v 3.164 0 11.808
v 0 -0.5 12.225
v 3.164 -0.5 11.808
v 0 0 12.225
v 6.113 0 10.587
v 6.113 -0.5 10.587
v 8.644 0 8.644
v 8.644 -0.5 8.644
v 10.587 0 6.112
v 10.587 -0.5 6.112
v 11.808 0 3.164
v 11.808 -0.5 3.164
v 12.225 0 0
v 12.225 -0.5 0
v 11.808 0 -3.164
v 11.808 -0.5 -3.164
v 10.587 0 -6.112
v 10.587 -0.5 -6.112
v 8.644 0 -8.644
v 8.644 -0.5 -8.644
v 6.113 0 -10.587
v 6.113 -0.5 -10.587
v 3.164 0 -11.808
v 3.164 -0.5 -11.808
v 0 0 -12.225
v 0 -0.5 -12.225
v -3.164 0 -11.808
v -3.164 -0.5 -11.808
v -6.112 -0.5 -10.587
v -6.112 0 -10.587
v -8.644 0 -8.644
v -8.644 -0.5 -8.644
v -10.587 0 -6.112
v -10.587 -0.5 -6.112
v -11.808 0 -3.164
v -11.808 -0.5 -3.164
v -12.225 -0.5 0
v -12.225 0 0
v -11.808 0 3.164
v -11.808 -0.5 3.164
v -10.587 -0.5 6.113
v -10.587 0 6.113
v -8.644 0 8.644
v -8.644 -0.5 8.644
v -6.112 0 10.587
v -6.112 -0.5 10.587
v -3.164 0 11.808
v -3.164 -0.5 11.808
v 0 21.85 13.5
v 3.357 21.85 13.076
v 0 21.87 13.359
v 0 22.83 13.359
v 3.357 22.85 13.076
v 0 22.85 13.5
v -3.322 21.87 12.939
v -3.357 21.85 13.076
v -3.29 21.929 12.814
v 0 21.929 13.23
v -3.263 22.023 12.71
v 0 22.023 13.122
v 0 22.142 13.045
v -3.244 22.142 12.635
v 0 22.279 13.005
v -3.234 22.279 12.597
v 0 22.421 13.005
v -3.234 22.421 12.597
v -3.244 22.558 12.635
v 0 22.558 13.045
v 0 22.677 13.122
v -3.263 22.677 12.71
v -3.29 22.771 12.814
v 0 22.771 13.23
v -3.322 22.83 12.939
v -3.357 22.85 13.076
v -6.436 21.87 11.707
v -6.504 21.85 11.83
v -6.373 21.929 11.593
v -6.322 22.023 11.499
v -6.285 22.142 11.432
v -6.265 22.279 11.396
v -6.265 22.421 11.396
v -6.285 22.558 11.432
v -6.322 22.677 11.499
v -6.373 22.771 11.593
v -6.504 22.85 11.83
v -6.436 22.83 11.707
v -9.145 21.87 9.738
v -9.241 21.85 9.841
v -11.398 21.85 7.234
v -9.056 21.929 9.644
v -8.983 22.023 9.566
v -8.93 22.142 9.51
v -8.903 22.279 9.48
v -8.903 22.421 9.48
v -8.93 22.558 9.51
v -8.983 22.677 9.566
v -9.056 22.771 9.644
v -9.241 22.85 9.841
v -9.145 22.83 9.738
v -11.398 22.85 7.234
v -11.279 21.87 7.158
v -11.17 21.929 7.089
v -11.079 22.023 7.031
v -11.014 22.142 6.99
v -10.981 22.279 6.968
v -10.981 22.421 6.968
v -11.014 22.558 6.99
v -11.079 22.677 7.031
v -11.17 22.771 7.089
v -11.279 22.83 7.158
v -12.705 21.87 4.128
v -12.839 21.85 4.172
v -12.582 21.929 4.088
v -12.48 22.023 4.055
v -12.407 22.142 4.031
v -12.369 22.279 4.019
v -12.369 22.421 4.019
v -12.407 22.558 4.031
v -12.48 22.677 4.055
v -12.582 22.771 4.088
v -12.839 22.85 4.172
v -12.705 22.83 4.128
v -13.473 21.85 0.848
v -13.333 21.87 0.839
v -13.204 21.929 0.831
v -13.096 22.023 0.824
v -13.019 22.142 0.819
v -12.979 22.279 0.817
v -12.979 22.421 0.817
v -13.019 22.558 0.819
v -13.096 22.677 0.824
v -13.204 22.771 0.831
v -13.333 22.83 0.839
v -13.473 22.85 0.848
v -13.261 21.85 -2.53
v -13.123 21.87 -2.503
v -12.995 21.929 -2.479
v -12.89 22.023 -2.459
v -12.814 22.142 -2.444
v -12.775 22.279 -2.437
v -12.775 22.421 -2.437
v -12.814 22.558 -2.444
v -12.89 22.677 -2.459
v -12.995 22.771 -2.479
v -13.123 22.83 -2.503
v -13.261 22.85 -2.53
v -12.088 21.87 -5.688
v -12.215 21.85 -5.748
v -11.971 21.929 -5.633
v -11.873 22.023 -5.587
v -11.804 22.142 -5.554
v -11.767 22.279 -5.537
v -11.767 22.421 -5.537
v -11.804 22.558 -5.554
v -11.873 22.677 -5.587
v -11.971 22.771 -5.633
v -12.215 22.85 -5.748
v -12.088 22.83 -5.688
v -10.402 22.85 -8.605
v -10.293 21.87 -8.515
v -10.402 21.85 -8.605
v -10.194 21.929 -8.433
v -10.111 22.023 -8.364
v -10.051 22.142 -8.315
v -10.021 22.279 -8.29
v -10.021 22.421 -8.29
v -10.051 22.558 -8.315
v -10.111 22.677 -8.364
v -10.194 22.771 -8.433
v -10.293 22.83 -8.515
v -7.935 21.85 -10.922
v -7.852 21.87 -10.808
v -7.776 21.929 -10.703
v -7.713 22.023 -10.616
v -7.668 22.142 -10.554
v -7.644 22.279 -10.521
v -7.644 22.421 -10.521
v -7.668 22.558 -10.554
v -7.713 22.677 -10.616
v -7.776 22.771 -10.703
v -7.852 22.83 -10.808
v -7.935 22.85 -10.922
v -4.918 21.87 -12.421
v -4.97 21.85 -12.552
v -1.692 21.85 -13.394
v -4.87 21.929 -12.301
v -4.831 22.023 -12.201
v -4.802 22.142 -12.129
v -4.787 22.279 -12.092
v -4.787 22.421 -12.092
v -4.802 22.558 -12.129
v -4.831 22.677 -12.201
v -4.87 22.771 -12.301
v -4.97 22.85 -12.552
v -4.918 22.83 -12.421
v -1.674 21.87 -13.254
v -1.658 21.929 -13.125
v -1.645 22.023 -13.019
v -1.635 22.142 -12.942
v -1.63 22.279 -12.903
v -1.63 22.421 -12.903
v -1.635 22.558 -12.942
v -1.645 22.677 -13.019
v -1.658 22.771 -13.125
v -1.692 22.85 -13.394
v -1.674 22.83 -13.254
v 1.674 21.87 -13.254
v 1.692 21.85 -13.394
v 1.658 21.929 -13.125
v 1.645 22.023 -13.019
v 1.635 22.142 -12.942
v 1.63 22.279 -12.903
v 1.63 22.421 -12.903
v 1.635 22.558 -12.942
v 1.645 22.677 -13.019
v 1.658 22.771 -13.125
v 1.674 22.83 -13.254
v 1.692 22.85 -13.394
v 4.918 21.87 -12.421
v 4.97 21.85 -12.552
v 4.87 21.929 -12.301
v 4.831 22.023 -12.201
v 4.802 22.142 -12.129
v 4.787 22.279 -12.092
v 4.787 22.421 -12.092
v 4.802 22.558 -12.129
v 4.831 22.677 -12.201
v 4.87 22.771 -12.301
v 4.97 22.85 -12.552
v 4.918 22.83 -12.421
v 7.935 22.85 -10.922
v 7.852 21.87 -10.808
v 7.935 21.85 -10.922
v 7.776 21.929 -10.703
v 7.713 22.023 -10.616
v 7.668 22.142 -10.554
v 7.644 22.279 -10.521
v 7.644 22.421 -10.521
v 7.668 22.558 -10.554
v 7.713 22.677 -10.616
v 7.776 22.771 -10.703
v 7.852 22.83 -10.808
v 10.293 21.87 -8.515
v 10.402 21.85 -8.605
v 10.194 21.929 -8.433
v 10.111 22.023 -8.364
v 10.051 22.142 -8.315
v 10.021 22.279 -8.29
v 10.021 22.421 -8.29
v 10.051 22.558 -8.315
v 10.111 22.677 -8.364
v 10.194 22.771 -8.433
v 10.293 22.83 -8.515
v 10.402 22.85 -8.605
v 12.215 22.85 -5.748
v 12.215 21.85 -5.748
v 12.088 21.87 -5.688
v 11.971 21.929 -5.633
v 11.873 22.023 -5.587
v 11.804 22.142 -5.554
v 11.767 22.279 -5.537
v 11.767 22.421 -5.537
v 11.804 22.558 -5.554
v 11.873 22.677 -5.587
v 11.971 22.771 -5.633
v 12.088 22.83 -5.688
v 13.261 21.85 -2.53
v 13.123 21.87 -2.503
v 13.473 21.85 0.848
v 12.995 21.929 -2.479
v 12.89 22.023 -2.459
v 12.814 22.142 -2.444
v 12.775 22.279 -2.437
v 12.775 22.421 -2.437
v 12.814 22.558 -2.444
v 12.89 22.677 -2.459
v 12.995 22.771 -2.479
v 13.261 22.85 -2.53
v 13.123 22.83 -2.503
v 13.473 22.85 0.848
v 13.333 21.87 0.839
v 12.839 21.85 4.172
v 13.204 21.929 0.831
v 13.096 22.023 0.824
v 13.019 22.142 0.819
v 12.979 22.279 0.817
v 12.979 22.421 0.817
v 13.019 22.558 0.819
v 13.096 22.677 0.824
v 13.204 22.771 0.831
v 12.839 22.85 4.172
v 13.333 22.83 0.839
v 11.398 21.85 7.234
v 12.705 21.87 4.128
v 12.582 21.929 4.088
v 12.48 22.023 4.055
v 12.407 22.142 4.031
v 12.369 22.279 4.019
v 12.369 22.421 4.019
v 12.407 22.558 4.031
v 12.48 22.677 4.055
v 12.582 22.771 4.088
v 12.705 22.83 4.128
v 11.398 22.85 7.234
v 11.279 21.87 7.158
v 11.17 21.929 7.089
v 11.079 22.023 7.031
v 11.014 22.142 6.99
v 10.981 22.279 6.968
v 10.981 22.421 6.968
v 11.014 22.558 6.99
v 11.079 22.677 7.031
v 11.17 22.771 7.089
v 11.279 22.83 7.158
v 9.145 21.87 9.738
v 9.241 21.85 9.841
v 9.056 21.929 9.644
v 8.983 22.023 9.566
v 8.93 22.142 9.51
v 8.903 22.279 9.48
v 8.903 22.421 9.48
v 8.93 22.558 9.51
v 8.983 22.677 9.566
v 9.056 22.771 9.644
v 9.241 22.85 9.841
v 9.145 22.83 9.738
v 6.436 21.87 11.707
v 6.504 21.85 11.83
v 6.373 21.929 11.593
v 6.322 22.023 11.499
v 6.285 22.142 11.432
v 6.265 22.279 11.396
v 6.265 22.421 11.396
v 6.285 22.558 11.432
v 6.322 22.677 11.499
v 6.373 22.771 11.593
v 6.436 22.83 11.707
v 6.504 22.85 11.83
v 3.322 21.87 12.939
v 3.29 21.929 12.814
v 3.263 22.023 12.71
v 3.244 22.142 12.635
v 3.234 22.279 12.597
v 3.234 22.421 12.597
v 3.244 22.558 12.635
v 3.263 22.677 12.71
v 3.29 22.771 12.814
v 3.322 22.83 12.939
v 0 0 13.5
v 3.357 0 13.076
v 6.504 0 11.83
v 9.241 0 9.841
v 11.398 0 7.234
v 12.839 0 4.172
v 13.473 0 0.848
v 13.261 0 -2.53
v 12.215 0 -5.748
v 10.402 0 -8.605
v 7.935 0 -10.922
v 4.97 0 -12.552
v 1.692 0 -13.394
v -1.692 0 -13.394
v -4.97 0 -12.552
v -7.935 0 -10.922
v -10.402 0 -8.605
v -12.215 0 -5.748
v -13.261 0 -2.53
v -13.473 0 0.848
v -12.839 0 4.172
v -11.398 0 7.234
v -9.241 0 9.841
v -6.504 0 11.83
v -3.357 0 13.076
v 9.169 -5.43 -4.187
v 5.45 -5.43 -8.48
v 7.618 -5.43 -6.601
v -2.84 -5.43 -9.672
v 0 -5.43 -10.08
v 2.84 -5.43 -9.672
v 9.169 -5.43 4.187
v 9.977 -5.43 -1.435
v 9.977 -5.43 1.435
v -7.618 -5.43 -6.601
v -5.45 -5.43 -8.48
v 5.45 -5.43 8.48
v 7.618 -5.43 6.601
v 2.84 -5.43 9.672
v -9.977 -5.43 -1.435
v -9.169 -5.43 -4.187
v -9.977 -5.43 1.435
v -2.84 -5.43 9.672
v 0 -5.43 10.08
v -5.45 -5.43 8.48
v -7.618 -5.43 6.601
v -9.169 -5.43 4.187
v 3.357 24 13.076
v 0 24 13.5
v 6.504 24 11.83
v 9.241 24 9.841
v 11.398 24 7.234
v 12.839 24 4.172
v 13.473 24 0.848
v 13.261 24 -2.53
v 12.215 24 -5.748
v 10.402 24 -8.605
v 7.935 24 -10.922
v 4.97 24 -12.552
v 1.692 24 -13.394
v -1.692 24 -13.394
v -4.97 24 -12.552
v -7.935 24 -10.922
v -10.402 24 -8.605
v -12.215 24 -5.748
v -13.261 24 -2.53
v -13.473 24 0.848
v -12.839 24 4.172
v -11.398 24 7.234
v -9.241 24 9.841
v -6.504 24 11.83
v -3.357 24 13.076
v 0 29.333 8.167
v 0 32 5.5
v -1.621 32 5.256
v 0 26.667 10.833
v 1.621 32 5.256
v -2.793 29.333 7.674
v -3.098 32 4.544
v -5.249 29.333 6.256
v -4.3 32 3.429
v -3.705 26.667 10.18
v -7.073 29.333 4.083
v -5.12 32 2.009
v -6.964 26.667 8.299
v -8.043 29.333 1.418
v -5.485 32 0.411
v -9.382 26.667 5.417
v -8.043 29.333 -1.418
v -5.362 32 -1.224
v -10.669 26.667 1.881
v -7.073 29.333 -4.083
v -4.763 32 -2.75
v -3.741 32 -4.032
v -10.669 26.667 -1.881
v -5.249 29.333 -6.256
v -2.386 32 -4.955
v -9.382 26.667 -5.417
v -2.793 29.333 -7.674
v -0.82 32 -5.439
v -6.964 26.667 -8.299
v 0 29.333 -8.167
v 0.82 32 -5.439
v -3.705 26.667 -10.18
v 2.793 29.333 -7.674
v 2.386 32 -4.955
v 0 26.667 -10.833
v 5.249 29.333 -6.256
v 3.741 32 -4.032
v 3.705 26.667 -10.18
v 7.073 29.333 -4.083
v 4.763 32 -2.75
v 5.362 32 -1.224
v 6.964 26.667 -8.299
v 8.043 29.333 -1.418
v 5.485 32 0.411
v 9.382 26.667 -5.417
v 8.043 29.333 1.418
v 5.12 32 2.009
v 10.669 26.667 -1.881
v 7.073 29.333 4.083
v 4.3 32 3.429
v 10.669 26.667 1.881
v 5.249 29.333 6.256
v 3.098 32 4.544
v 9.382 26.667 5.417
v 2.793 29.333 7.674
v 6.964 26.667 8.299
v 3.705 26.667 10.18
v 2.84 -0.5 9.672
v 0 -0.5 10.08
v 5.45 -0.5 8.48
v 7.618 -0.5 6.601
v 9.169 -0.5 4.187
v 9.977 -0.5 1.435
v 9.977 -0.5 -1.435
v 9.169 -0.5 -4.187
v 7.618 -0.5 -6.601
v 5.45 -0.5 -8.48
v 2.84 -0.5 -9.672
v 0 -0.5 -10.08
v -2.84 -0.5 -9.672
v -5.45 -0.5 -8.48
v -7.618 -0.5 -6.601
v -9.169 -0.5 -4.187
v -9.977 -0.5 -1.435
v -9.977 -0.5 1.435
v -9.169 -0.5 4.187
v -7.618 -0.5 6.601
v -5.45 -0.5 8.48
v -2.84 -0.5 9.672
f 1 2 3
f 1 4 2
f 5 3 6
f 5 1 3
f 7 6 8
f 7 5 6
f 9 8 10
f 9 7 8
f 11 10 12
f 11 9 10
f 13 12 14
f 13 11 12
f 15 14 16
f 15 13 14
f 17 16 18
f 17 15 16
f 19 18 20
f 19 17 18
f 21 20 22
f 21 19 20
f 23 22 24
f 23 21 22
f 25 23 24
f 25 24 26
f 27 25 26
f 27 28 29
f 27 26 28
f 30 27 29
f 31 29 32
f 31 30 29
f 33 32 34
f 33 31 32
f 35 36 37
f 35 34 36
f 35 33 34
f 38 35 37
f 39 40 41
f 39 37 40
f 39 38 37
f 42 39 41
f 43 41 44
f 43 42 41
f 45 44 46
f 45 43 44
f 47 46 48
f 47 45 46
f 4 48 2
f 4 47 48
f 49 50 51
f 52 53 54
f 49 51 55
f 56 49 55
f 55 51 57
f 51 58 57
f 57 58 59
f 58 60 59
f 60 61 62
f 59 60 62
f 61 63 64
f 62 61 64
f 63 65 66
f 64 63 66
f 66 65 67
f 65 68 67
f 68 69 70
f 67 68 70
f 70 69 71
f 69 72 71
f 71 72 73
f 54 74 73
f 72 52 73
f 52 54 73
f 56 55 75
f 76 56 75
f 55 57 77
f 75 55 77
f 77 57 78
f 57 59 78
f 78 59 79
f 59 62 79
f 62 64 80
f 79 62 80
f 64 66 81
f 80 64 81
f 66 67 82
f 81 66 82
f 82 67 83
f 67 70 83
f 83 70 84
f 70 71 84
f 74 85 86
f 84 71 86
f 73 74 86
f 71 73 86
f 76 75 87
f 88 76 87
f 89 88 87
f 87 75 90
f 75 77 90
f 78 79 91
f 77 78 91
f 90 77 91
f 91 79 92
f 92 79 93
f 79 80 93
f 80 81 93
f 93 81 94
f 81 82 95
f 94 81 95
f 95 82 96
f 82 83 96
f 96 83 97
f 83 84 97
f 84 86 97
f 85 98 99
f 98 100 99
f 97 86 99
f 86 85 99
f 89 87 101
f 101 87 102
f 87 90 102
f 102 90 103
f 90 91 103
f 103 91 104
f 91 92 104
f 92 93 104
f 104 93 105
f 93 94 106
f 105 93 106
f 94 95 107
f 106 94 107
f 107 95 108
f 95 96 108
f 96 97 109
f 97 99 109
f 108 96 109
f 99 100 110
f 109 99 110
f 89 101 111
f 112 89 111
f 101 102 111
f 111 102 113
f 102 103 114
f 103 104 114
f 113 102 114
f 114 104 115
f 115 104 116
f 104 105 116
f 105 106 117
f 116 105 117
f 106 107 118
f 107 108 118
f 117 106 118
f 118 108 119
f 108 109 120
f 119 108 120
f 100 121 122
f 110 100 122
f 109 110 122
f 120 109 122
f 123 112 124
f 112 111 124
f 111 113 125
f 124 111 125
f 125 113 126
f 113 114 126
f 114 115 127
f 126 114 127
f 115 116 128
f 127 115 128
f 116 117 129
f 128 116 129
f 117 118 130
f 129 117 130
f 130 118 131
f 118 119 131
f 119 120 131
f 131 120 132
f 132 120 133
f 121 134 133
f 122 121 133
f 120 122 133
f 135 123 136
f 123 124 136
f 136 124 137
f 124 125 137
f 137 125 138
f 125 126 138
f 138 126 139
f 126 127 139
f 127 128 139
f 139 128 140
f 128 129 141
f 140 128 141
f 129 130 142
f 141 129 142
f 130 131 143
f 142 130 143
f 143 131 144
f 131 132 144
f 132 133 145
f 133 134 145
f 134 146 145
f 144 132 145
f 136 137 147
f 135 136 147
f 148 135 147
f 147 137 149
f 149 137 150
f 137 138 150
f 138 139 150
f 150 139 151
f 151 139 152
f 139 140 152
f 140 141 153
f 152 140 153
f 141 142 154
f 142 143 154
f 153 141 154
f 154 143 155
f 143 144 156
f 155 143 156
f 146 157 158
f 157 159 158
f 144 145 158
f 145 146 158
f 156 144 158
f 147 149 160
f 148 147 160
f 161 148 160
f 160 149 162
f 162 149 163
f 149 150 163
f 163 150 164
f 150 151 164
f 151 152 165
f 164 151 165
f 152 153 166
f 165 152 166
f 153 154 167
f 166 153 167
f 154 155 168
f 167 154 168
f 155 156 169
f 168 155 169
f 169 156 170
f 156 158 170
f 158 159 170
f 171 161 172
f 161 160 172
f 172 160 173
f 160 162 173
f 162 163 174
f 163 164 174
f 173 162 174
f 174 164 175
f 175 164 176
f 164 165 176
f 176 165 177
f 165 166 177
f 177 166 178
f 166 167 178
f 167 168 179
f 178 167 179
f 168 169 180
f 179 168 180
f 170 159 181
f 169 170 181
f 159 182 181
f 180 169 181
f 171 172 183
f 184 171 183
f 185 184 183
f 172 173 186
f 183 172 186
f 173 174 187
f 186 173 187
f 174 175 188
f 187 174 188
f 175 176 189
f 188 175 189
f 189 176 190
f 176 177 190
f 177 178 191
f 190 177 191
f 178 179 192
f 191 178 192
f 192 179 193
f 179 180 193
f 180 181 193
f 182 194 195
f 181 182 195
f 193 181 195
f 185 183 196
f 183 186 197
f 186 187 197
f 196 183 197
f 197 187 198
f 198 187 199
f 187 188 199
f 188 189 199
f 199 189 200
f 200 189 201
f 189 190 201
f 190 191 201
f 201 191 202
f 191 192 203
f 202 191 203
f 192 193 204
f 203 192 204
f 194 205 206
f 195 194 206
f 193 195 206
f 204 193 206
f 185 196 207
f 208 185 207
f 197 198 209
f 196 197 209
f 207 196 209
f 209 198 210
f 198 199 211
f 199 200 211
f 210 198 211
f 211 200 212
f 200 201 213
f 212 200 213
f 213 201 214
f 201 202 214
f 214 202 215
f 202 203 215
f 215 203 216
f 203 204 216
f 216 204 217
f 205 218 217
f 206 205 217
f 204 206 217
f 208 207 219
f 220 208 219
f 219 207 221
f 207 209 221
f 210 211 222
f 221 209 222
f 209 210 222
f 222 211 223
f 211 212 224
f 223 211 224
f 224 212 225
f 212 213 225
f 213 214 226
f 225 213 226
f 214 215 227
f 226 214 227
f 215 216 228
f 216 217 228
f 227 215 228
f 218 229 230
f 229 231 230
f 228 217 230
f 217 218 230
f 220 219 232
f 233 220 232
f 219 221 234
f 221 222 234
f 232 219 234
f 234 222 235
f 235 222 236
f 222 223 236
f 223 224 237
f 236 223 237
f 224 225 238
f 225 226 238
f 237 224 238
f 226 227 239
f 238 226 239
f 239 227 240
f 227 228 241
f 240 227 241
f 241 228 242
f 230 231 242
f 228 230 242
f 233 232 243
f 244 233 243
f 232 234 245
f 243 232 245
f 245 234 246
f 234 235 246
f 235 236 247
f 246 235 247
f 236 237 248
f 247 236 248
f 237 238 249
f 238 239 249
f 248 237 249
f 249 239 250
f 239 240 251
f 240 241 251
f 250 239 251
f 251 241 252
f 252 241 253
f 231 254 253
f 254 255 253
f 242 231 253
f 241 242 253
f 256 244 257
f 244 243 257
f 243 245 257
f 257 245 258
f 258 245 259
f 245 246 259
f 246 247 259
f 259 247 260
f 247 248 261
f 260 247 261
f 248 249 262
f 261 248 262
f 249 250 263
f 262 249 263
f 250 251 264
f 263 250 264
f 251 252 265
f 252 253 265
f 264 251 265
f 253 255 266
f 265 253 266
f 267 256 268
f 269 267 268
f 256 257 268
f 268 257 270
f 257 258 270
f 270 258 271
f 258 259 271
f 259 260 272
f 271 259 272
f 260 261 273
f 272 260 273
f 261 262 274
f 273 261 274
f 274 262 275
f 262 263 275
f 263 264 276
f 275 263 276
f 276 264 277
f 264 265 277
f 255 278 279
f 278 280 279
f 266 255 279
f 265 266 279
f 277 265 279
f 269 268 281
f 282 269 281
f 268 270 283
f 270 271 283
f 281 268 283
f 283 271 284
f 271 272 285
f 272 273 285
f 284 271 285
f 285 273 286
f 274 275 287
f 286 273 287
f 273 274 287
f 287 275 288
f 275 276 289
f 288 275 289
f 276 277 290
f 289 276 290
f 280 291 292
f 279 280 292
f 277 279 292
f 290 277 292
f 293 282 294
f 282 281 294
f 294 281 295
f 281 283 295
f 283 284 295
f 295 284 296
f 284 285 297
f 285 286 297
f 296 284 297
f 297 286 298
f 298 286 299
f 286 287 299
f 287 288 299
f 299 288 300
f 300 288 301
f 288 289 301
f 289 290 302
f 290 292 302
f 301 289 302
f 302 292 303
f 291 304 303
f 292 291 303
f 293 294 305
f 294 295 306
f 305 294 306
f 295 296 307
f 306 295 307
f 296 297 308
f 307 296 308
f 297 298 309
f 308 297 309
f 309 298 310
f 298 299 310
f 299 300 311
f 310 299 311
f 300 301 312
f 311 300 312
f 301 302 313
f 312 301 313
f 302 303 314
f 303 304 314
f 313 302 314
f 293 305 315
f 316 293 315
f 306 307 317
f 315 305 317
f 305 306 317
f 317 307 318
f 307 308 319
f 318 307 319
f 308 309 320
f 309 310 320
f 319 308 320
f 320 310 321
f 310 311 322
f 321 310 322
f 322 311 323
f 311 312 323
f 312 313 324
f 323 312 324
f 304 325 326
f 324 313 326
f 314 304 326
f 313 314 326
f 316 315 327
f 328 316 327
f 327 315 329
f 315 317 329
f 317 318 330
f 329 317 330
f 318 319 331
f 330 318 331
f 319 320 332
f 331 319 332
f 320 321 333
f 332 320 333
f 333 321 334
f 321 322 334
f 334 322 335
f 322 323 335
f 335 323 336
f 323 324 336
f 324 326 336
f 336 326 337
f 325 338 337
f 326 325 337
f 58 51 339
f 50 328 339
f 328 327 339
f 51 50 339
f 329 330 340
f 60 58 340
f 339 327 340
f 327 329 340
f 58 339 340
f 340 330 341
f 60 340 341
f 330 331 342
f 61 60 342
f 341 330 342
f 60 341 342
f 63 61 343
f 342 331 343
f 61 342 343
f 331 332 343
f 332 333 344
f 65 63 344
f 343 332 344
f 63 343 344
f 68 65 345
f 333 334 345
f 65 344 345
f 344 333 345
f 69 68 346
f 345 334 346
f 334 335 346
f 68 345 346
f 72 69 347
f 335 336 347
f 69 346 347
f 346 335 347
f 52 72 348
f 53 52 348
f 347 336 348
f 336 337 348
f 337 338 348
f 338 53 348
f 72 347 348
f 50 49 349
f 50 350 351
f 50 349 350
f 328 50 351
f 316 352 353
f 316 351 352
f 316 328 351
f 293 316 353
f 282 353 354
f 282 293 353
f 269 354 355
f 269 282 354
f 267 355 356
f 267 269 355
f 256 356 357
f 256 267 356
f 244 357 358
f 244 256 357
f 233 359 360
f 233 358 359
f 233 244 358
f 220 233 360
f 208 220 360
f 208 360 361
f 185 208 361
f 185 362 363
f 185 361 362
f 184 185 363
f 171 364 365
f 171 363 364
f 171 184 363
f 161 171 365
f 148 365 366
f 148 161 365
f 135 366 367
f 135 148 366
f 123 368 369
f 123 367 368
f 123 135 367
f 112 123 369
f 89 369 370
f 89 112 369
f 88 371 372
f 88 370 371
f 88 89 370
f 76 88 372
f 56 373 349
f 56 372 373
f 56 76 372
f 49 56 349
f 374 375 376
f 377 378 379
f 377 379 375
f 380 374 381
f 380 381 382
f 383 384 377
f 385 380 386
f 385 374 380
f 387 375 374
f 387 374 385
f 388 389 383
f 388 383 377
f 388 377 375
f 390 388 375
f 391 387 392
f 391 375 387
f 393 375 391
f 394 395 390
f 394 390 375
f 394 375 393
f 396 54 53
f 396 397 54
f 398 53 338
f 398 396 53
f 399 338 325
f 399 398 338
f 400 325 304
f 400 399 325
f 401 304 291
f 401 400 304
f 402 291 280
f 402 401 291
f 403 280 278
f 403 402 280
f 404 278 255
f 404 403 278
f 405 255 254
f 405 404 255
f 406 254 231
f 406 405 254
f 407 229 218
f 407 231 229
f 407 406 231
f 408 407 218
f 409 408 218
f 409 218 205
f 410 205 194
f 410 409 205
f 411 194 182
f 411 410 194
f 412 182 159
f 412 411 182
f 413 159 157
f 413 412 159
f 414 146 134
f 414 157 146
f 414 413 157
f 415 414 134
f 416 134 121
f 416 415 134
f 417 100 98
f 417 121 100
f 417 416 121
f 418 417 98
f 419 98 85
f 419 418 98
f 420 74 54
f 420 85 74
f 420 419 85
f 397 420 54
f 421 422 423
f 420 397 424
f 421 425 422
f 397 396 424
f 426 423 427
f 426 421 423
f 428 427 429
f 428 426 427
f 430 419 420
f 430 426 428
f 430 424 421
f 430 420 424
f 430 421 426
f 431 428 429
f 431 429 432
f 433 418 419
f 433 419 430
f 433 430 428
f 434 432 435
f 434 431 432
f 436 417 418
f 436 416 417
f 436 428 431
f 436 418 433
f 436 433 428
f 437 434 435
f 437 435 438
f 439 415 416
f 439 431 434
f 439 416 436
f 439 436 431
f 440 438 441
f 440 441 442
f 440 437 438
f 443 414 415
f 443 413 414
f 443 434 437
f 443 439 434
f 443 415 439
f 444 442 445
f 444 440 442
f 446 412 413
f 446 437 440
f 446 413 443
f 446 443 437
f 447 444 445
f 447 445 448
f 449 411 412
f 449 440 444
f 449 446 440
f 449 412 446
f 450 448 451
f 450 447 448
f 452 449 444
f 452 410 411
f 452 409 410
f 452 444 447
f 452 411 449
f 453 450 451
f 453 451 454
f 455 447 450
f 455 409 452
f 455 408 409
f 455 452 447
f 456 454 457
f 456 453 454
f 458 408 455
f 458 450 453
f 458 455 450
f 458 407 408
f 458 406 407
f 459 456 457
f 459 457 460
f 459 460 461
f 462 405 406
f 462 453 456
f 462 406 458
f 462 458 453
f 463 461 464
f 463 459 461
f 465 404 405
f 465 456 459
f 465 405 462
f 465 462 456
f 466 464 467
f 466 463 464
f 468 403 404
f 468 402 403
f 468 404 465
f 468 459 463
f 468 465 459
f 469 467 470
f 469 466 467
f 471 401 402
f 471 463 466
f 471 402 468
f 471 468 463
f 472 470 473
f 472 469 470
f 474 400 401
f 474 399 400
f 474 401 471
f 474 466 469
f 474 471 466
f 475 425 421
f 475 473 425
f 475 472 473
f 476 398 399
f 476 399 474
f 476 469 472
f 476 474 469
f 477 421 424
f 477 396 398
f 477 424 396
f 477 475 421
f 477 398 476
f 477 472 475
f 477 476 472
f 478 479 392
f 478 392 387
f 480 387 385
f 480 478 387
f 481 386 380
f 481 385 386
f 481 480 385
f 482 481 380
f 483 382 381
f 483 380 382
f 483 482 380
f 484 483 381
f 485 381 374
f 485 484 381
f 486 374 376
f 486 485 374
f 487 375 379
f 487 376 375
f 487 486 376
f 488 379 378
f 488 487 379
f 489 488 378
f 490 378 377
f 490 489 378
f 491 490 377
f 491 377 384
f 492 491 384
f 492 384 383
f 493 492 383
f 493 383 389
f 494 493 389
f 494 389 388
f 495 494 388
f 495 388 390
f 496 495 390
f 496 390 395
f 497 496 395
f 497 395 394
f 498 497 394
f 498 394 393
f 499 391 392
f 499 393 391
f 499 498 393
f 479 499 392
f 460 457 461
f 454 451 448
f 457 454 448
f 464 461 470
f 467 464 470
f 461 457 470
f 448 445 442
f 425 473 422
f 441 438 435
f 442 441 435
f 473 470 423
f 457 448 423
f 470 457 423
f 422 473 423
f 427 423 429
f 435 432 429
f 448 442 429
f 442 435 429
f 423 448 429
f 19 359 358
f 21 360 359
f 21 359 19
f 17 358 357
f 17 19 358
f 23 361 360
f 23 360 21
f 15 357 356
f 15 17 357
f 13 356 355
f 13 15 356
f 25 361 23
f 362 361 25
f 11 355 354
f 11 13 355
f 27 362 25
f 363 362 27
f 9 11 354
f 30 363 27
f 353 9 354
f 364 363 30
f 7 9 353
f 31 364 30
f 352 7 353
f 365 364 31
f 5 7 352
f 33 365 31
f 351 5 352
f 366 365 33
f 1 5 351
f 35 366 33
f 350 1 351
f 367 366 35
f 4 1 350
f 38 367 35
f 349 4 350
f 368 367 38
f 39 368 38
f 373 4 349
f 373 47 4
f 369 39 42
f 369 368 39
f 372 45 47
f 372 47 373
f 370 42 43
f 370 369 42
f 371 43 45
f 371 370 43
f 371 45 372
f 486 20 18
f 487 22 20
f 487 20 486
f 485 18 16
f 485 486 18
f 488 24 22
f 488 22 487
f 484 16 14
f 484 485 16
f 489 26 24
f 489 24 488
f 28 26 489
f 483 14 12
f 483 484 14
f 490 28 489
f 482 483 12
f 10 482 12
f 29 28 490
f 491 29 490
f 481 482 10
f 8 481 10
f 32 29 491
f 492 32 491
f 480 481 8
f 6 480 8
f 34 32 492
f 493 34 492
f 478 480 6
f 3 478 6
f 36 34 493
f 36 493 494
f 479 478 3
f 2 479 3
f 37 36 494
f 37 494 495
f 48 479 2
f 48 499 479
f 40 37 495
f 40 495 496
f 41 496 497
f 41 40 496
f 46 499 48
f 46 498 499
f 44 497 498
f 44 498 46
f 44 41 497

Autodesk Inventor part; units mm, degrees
ref_plane "YZ Plane" through (0, 0, 0) normal (1, 0, 0) x (0, 1, 0)
ref_plane "XZ Plane" through (0, 0, 0) normal (0, 1, 0) x (-1, 0, 0)
ref_plane "XY Plane" through (0, 0, 0) normal (0, 0, 1) x (1, 0, 0)
sketch "Skizze1" plane through (0, 0, 0) normal (1, 0, 0) x (0, 1, 0)
  line L0 (0, 13.5) -> (24, 13.5)
  line L1 (24, 13.5) -> (32, 5.5)
  line L2 (32, 5.5) -> (32, 0)
  line L3 (32, 0) -> (0, 0)
  line L4 (0, 0) -> (0, 13.5)
  arc A0 (21.85, 13.5) -> (22.85, 13.5) centre (22.35, 13.5) ccw
  line L5 (0, 0) -> (-0.5, 0)
  line L6 (-0.5, 0) -> (-0.5, 12.225)
  line L7 (-0.5, 12.225) -> (0, 12.225)
  line L8 (0, 12.225) -> (0, 0)
  line L9 (-0.5, 0) -> (-5.43, 0)
  line L10 (-5.43, 0) -> (-5.43, 10.08)
  line L11 (-5.43, 10.08) -> (-0.5, 10.08)
  line L12 (-0.5, 10.08) -> (-0.5, 0)
  point P0 (-0.5, 10.08)
  dimension "d0" = 24
  dimension "d1" = 135
  dimension "d2" = 5.5
  dimension "d3" = 1
  dimension "d4" = 0.5
  dimension "d5" = 1.15
  dimension "d6" = 0.5
  dimension "d7" = 12.225
  dimension "d8" = 4.93
  dimension "d9" = 10.08
revolve "Umdrehung1" add sketch "Skizze1" angle 360 about axis through (0, 32, 0) along (0, -1, 0) contours L0 A0 L1 L2 L3 L4 | L4 L5 L6 L7 | L9 L10 L11 L6
properties part number "00_10x_Objective_ViewSolutions_bm05073332"
